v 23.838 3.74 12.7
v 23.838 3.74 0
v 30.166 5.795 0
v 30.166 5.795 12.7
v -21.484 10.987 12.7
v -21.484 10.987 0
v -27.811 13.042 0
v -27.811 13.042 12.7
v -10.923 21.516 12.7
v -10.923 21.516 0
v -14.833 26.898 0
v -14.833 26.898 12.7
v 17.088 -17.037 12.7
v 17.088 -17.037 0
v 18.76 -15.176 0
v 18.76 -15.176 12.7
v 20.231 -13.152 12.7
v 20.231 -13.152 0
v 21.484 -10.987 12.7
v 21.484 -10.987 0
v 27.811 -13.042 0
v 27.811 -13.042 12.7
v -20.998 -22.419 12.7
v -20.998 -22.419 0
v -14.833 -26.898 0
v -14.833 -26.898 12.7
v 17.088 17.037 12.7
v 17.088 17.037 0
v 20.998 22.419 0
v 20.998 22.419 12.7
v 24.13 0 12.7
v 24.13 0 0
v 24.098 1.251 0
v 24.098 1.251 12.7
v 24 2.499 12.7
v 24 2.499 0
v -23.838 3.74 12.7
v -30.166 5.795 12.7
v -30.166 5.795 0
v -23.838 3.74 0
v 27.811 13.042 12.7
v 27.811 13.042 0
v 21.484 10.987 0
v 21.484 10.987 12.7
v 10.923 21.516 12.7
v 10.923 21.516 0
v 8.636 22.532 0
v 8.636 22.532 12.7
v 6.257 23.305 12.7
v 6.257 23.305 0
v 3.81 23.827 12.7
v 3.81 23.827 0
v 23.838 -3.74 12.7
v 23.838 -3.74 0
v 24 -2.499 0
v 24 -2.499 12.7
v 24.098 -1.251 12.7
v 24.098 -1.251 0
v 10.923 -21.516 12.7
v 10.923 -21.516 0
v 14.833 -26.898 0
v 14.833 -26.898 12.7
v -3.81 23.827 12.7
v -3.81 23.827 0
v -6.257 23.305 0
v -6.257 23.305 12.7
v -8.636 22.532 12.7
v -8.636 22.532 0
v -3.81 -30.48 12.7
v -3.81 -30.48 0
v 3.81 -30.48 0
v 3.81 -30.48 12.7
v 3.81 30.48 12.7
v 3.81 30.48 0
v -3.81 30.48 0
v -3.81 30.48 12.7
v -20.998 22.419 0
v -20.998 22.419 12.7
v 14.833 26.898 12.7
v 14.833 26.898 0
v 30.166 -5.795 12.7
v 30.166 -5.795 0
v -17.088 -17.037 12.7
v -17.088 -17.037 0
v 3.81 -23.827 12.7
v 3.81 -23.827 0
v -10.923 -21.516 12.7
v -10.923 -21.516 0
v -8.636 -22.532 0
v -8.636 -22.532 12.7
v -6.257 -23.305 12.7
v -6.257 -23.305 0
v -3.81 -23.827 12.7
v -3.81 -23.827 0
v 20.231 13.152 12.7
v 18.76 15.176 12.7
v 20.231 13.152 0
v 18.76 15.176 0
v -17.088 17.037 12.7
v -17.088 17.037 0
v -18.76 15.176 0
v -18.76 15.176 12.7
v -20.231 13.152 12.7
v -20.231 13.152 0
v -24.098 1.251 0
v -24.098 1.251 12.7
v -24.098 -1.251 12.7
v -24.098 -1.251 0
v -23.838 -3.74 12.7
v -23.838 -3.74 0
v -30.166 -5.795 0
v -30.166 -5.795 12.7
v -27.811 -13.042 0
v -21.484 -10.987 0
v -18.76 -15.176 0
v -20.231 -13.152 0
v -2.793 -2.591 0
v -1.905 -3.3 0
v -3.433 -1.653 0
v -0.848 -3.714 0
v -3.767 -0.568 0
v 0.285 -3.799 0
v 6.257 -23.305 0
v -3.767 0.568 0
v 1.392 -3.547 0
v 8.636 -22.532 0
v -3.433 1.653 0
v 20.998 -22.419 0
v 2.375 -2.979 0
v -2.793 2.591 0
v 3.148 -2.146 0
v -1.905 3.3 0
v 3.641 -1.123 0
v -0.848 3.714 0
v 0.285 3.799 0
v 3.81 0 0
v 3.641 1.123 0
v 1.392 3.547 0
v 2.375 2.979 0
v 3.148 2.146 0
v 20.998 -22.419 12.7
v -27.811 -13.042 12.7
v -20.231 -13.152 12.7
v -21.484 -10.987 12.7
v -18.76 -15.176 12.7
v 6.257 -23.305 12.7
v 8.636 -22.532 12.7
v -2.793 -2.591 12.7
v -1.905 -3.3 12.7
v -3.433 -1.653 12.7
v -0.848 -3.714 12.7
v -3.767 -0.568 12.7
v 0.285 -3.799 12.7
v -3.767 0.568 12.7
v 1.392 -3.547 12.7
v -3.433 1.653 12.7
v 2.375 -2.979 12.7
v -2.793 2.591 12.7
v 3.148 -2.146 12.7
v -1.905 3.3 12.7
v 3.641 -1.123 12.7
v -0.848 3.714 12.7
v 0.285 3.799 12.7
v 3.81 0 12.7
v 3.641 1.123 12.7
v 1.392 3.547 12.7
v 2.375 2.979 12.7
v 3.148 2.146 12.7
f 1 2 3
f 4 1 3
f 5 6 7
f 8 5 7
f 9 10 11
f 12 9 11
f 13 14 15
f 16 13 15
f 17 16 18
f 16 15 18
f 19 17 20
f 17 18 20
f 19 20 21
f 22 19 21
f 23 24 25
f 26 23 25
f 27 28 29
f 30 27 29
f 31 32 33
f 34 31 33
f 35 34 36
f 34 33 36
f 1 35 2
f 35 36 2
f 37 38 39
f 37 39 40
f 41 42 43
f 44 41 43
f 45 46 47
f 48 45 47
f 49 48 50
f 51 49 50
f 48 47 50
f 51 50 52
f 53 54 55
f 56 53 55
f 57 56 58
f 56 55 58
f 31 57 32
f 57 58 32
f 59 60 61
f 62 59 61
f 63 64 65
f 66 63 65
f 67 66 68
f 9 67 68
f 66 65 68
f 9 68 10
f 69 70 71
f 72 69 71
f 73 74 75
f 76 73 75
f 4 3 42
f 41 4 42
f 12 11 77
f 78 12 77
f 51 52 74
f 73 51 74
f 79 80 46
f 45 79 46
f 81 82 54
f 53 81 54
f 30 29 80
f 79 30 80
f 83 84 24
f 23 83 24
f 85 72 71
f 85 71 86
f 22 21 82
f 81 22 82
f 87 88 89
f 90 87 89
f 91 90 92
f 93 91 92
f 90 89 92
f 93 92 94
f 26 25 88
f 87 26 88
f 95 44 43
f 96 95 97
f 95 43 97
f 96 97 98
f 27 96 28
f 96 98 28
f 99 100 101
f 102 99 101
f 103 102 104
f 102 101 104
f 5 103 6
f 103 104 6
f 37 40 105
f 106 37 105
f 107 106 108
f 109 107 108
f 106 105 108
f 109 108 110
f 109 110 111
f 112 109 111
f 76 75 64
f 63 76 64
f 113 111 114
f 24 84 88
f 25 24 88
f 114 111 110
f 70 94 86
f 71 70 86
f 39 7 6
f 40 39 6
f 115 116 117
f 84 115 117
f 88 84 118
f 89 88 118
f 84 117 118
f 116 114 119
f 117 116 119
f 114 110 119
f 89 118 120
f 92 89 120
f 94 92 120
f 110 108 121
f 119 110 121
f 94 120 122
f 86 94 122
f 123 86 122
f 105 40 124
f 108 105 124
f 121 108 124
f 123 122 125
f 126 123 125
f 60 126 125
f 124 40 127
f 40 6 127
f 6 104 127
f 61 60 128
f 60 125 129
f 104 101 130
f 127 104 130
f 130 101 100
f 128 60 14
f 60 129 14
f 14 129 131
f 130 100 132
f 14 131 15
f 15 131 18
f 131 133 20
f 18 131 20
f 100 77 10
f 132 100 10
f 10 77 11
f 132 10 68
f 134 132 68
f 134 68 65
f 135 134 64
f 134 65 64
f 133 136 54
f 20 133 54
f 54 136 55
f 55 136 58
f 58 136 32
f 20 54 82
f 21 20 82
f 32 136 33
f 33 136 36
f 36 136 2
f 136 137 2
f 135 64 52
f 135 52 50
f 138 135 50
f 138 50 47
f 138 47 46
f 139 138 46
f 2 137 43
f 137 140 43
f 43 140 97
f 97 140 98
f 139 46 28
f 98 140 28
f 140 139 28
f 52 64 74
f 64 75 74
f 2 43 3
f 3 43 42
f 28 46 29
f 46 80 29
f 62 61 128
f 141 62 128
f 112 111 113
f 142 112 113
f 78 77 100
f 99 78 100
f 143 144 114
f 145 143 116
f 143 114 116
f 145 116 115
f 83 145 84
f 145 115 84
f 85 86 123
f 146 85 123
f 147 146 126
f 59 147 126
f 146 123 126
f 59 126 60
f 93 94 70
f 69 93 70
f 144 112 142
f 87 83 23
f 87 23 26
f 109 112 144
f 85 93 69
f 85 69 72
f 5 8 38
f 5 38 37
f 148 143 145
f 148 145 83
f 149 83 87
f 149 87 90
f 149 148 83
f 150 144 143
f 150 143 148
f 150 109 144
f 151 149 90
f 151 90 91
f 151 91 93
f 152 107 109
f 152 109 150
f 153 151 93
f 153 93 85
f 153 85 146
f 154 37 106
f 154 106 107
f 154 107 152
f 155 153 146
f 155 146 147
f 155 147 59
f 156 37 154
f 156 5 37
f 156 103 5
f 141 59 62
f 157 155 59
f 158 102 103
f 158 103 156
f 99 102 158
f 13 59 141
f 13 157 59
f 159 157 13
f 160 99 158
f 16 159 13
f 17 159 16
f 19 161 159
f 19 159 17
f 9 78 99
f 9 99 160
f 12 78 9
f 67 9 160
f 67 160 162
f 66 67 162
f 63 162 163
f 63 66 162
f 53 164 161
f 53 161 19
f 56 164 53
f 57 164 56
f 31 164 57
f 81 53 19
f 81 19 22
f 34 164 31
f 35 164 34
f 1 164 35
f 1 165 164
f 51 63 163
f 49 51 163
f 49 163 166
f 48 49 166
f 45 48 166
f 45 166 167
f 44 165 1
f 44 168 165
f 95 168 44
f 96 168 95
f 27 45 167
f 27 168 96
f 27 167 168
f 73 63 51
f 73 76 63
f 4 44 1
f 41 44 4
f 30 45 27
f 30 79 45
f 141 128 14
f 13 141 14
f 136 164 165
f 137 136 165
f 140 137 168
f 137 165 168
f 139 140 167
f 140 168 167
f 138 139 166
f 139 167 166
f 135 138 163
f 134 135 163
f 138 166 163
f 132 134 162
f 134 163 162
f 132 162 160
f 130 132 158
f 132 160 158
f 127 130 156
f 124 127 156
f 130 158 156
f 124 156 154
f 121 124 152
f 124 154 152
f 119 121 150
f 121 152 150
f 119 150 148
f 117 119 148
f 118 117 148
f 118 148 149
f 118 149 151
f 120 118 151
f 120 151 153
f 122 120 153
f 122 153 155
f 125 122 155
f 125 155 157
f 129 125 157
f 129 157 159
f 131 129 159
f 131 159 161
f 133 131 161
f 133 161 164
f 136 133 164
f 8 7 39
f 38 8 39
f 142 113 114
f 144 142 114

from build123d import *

# Parameters (mm, degrees)
F1_DEPTH = 12.7
F2_R     = 3.81
F3_DEPTH = 25.4


# Not quite as in the source:
# - a feature names something its author has since deleted; it is built from what else it names


with BuildPart() as f1:
    # F0 (on Top) → F1 (new body)
    with BuildSketch(Plane.XY):
        with BuildLine():
            ThreePointArc((23.8384751489, -3.7395190297), (24.0570083899, -1.8754325709), (24.13, 0))
            ThreePointArc((24.13, 0), (24.0570083899, 1.8754325709), (23.8384751489, 3.7395190297))
            Line((23.8384751489, 3.7395190297), (12.3294189943, 0))
            Line((12.3294189943, 0), (23.8384751489, -3.7395190297))
        make_face()
        with BuildLine():
            Line((12.3294189943, 0), (23.8384751489, 3.7395190297))
            ThreePointArc((23.8384751489, 3.7395190297), (22.9489937382, 7.4565800743), (21.4837656518, 10.9865696839))
            Line((21.4837656518, 10.9865696839), (9.9747094971, 7.2470506542))
            Line((9.9747094971, 7.2470506542), (6.1647094971, 2.0030355372))
            Line((6.1647094971, 2.0030355372), (12.3294189943, 0))
        make_face()
        with BuildLine():
            ThreePointArc((21.4837656518, 10.9865696839), (22.9489937382, 7.4565800743), (23.8384751489, 3.7395190297))
            Line((23.8384751489, 3.7395190297), (30.1655573652, 5.7953126615))
            Line((30.1655573652, 5.7953126615), (27.8108478681, 13.0423633156))
            Line((27.8108478681, 13.0423633156), (21.4837656518, 10.9865696839))
        make_face()
        with BuildLine():
            Line((30.1655573652, -5.7953126615), (23.8384751489, -3.7395190297))
            ThreePointArc((23.8384751489, -3.7395190297), (22.9489937382, -7.4565800743), (21.4837656518, -10.9865696839))
            Line((21.4837656518, -10.9865696839), (27.8108478681, -13.0423633156))
            Line((27.8108478681, -13.0423633156), (30.1655573652, -5.7953126615))
        make_face()
        with BuildLine():
            ThreePointArc((21.4837656518, -10.9865696839), (22.9489937382, -7.4565800743), (23.8384751489, -3.7395190297))
            Line((23.8384751489, -3.7395190297), (12.3294189943, 0))
            Line((12.3294189943, 0), (6.1647094971, -2.0030355372))
            Line((6.1647094971, -2.0030355372), (9.9747094971, -7.2470506542))
            Line((9.9747094971, -7.2470506542), (21.4837656518, -10.9865696839))
        make_face()
        with BuildLine():
            Line((9.9747094971, 7.2470506542), (21.4837656518, 10.9865696839))
            ThreePointArc((21.4837656518, 10.9865696839), (19.5215800743, 14.1832581378), (17.0876973792, 17.0372385755))
            Line((17.0876973792, 17.0372385755), (9.9747094971, 7.2470506542))
        make_face()
        with BuildLine():
            ThreePointArc((17.0876973792, -17.0372385755), (19.5215800743, -14.1832581378), (21.4837656518, -10.9865696839))
            Line((21.4837656518, -10.9865696839), (9.9747094971, -7.2470506542))
            Line((9.9747094971, -7.2470506542), (17.0876973792, -17.0372385755))
        make_face()
        with BuildLine():
            Line((9.9747094971, 7.2470506542), (17.0876973792, 17.0372385755))
            ThreePointArc((17.0876973792, 17.0372385755), (14.1832581378, 19.5215800743), (10.922987882, 21.516162198))
            Line((10.922987882, 21.516162198), (3.81, 11.7259742766))
            Line((3.81, 11.7259742766), (3.81, 5.244015117))
            Line((3.81, 5.244015117), (9.9747094971, 7.2470506542))
        make_face()
        with BuildLine():
            ThreePointArc((10.922987882, 21.516162198), (14.1832581378, 19.5215800743), (17.0876973792, 17.0372385755))
            Line((17.0876973792, 17.0372385755), (20.9980492384, 22.4193761773))
            Line((20.9980492384, 22.4193761773), (14.8333397413, 26.8982997998))
            Line((14.8333397413, 26.8982997998), (10.922987882, 21.516162198))
        make_face()
        with BuildLine():
            Line((20.9980492384, -22.4193761773), (17.0876973792, -17.0372385755))
            ThreePointArc((17.0876973792, -17.0372385755), (14.1832581378, -19.5215800743), (10.922987882, -21.516162198))
            Line((10.922987882, -21.516162198), (14.8333397413, -26.8982997998))
            Line((14.8333397413, -26.8982997998), (20.9980492384, -22.4193761773))
        make_face()
        with BuildLine():
            ThreePointArc((10.922987882, -21.516162198), (14.1832581378, -19.5215800743), (17.0876973792, -17.0372385755))
            Line((17.0876973792, -17.0372385755), (9.9747094971, -7.2470506542))
            Line((9.9747094971, -7.2470506542), (3.81, -5.244015117))
            Line((3.81, -5.244015117), (3.81, -11.7259742766))
            Line((3.81, -11.7259742766), (10.922987882, -21.516162198))
        make_face()
        with BuildLine():
            Line((3.81, 11.7259742766), (10.922987882, 21.516162198))
            ThreePointArc((10.922987882, 21.516162198), (7.4565800743, 22.9489937382), (3.81, 23.8273120599))
            Line((3.81, 23.8273120599), (3.81, 11.7259742766))
        make_face()
        with BuildLine():
            ThreePointArc((3.81, -23.8273120599), (7.4565800743, -22.9489937382), (10.922987882, -21.516162198))
            Line((10.922987882, -21.516162198), (3.81, -11.7259742766))
            Line((3.81, -11.7259742766), (3.81, -23.8273120599))
        make_face()
        with BuildLine():
            Line((3.81, 11.7259742766), (3.81, 23.8273120599))
            ThreePointArc((3.81, 23.8273120599), (0, 24.13), (-3.81, 23.8273120599))
            Line((-3.81, 23.8273120599), (-3.81, 11.7259742766))
            Line((-3.81, 11.7259742766), (0, 6.4819591596))
            Line((0, 6.4819591596), (3.81, 11.7259742766))
        make_face()
        with BuildLine():
            ThreePointArc((-3.81, 23.8273120599), (0, 24.13), (3.81, 23.8273120599))
            Line((3.81, 23.8273120599), (3.81, 30.48))
            Line((3.81, 30.48), (-3.81, 30.48))
            Line((-3.81, 30.48), (-3.81, 23.8273120599))
        make_face()
        with BuildLine():
            Line((3.81, -30.48), (3.81, -23.8273120599))
            ThreePointArc((3.81, -23.8273120599), (0, -24.13), (-3.81, -23.8273120599))
            Line((-3.81, -23.8273120599), (-3.81, -30.48))
            Line((-3.81, -30.48), (3.81, -30.48))
        make_face()
        with BuildLine():
            ThreePointArc((-3.81, -23.8273120599), (0, -24.13), (3.81, -23.8273120599))
            Line((3.81, -23.8273120599), (3.81, -11.7259742766))
            Line((3.81, -11.7259742766), (0, -6.4819591596))
            Line((0, -6.4819591596), (-3.81, -11.7259742766))
            Line((-3.81, -11.7259742766), (-3.81, -23.8273120599))
        make_face()
        with BuildLine():
            Line((-3.81, 11.7259742766), (-3.81, 23.8273120599))
            ThreePointArc((-3.81, 23.8273120599), (-7.4565800743, 22.9489937382), (-10.922987882, 21.516162198))
            Line((-10.922987882, 21.516162198), (-3.81, 11.7259742766))
        make_face()
        with BuildLine():
            ThreePointArc((-10.922987882, -21.516162198), (-7.4565800743, -22.9489937382), (-3.81, -23.8273120599))
            Line((-3.81, -23.8273120599), (-3.81, -11.7259742766))
            Line((-3.81, -11.7259742766), (-10.922987882, -21.516162198))
        make_face()
        with BuildLine():
            Line((-3.81, 11.7259742766), (-10.922987882, 21.516162198))
            ThreePointArc((-10.922987882, 21.516162198), (-14.1832581378, 19.5215800743), (-17.0876973792, 17.0372385755))
            Line((-17.0876973792, 17.0372385755), (-9.9747094971, 7.2470506542))
            Line((-9.9747094971, 7.2470506542), (-3.81, 5.244015117))
            Line((-3.81, 5.244015117), (-3.81, 11.7259742766))
        make_face()
        with BuildLine():
            ThreePointArc((-17.0876973792, 17.0372385755), (-14.1832581378, 19.5215800743), (-10.922987882, 21.516162198))
            Line((-10.922987882, 21.516162198), (-14.8333397413, 26.8982997998))
            Line((-14.8333397413, 26.8982997998), (-20.9980492384, 22.4193761773))
            Line((-20.9980492384, 22.4193761773), (-17.0876973792, 17.0372385755))
        make_face()
        with BuildLine():
            Line((-14.8333397413, -26.8982997998), (-10.922987882, -21.516162198))
            ThreePointArc((-10.922987882, -21.516162198), (-14.1832581378, -19.5215800743), (-17.0876973792, -17.0372385755))
            Line((-17.0876973792, -17.0372385755), (-20.9980492384, -22.4193761773))
            Line((-20.9980492384, -22.4193761773), (-14.8333397413, -26.8982997998))
        make_face()
        with BuildLine():
            ThreePointArc((-17.0876973792, -17.0372385755), (-14.1832581378, -19.5215800743), (-10.922987882, -21.516162198))
            Line((-10.922987882, -21.516162198), (-3.81, -11.7259742766))
            Line((-3.81, -11.7259742766), (-3.81, -5.244015117))
            Line((-3.81, -5.244015117), (-9.9747094971, -7.2470506542))
            Line((-9.9747094971, -7.2470506542), (-17.0876973792, -17.0372385755))
        make_face()
        with BuildLine():
            Line((-9.9747094971, 7.2470506542), (-17.0876973792, 17.0372385755))
            ThreePointArc((-17.0876973792, 17.0372385755), (-19.5215800743, 14.1832581378), (-21.4837656518, 10.9865696839))
            Line((-21.4837656518, 10.9865696839), (-9.9747094971, 7.2470506542))
        make_face()
        with BuildLine():
            ThreePointArc((-21.4837656518, -10.9865696839), (-19.5215800743, -14.1832581378), (-17.0876973792, -17.0372385755))
            Line((-17.0876973792, -17.0372385755), (-9.9747094971, -7.2470506542))
            Line((-9.9747094971, -7.2470506542), (-21.4837656518, -10.9865696839))
        make_face()
        with BuildLine():
            Line((-9.9747094971, 7.2470506542), (-21.4837656518, 10.9865696839))
            ThreePointArc((-21.4837656518, 10.9865696839), (-22.9489937382, 7.4565800743), (-23.8384751489, 3.7395190297))
            Line((-23.8384751489, 3.7395190297), (-12.3294189943, 0))
            Line((-12.3294189943, 0), (-6.1647094971, 2.0030355372))
            Line((-6.1647094971, 2.0030355372), (-9.9747094971, 7.2470506542))
        make_face()
        with BuildLine():
            ThreePointArc((-23.8384751489, 3.7395190297), (-22.9489937382, 7.4565800743), (-21.4837656518, 10.9865696839))
            Line((-21.4837656518, 10.9865696839), (-27.8108478681, 13.0423633156))
            Line((-27.8108478681, 13.0423633156), (-30.1655573652, 5.7953126615))
            Line((-30.1655573652, 5.7953126615), (-23.8384751489, 3.7395190297))
        make_face()
        with BuildLine():
            Line((-27.8108478681, -13.0423633156), (-21.4837656518, -10.9865696839))
            ThreePointArc((-21.4837656518, -10.9865696839), (-22.9489937382, -7.4565800743), (-23.8384751489, -3.7395190297))
            Line((-23.8384751489, -3.7395190297), (-30.1655573652, -5.7953126615))
            Line((-30.1655573652, -5.7953126615), (-27.8108478681, -13.0423633156))
        make_face()
        with BuildLine():
            ThreePointArc((-23.8384751489, -3.7395190297), (-22.9489937382, -7.4565800743), (-21.4837656518, -10.9865696839))
            Line((-21.4837656518, -10.9865696839), (-9.9747094971, -7.2470506542))
            Line((-9.9747094971, -7.2470506542), (-6.1647094971, -2.0030355372))
            Line((-6.1647094971, -2.0030355372), (-12.3294189943, 0))
            Line((-12.3294189943, 0), (-23.8384751489, -3.7395190297))
        make_face()
        with BuildLine():
            Line((-12.3294189943, 0), (-23.8384751489, 3.7395190297))
            ThreePointArc((-23.8384751489, 3.7395190297), (-24.13, 0), (-23.8384751489, -3.7395190297))
            Line((-23.8384751489, -3.7395190297), (-12.3294189943, 0))
        make_face()
        Polygon((0, -6.4819591596), (1.4552905029, -4.4789236225), (0, -4.0060710743), (-1.4552905029, -4.4789236225), align=None)
        Polygon((-3.81, -5.244015117), (-1.4552905029, -4.4789236225), (-2.3547094971, -3.2409795798), (-3.81, -2.7681270317), align=None)
        Polygon((-3.81, -2.7681270317), (-3.81, -1.2379440426), (-4.7094189943, 0), (-6.1647094971, -2.0030355372), align=None)
        Polygon((-3.81, 1.2379440426), (-3.81, 2.7681270317), (-6.1647094971, 2.0030355372), (-4.7094189943, 0), align=None)
        Polygon((3.81, -5.244015117), (3.81, -2.7681270317), (2.3547094971, -3.2409795798), (1.4552905029, -4.4789236225), align=None)
        Polygon((3.81, -2.7681270317), (6.1647094971, -2.0030355372), (4.7094189943, 0), (3.81, -1.2379440426), align=None)
        Polygon((6.1647094971, -2.0030355372), (12.3294189943, 0), (6.1647094971, 2.0030355372), (4.7094189943, 0), align=None)
        Polygon((9.9747094971, -7.2470506542), (6.1647094971, -2.0030355372), (3.81, -2.7681270317), (3.81, -5.244015117), align=None)
        Polygon((2.3547094971, -3.2409795798), (3.81, -2.7681270317), (3.81, -1.2379440426), (3.0823547486, -2.2394618112), align=None)
        Polygon((3.81, -11.7259742766), (3.81, -5.244015117), (1.4552905029, -4.4789236225), (0, -6.4819591596), align=None)
        Polygon((1.4552905029, -4.4789236225), (2.3547094971, -3.2409795798), (1.1773547486, -3.6235253271), (0, -4.0060710743), align=None)
        Polygon((-3.81, -11.7259742766), (0, -6.4819591596), (-1.4552905029, -4.4789236225), (-3.81, -5.244015117), align=None)
        Polygon((-1.4552905029, -4.4789236225), (0, -4.0060710743), (-1.1773547486, -3.6235253271), (-2.3547094971, -3.2409795798), align=None)
        Polygon((-9.9747094971, -7.2470506542), (-3.81, -5.244015117), (-3.81, -2.7681270317), (-6.1647094971, -2.0030355372), align=None)
        Polygon((-3.81, -2.7681270317), (-2.3547094971, -3.2409795798), (-3.0823547486, -2.2394618112), (-3.81, -1.2379440426), align=None)
        Polygon((-4.7094189943, 0), (-6.1647094971, 2.0030355372), (-12.3294189943, 0), (-6.1647094971, -2.0030355372), align=None)
        Polygon((-3.81, -1.2379440426), (-3.81, 0), (-3.81, 1.2379440426), (-4.7094189943, 0), align=None)
        Polygon((-3.81, 2.7681270317), (-3.81, 5.244015117), (-9.9747094971, 7.2470506542), (-6.1647094971, 2.0030355372), align=None)
        Polygon((-3.0823547486, 2.2394618112), (-2.3547094971, 3.2409795798), (-3.81, 2.7681270317), (-3.81, 1.2379440426), align=None)
        Polygon((-1.4552905029, 4.4789236225), (0, 6.4819591596), (-3.81, 11.7259742766), (-3.81, 5.244015117), align=None)
        Polygon((-2.3547094971, 3.2409795798), (-1.4552905029, 4.4789236225), (-3.81, 5.244015117), (-3.81, 2.7681270317), align=None)
        Polygon((6.1647094971, 2.0030355372), (9.9747094971, 7.2470506542), (3.81, 5.244015117), (3.81, 2.7681270317), align=None)
        Polygon((1.4552905029, 4.4789236225), (3.81, 5.244015117), (3.81, 11.7259742766), (0, 6.4819591596), align=None)
        Polygon((-1.1773547486, 3.6235253271), (0, 4.0060710743), (-1.4552905029, 4.4789236225), (-2.3547094971, 3.2409795798), align=None)
        Polygon((0, 4.0060710743), (1.4552905029, 4.4789236225), (0, 6.4819591596), (-1.4552905029, 4.4789236225), align=None)
        Polygon((2.3547094971, 3.2409795798), (1.4552905029, 4.4789236225), (0, 4.0060710743), (1.1773547486, 3.6235253271), align=None)
        Polygon((3.81, 1.2379440426), (3.81, 2.7681270317), (2.3547094971, 3.2409795798), (3.0823547486, 2.2394618112), align=None)
        Polygon((4.7094189943, 0), (6.1647094971, 2.0030355372), (3.81, 2.7681270317), (3.81, 1.2379440426), align=None)
        Polygon((3.81, -1.2379440426), (4.7094189943, 0), (3.81, 1.2379440426), (3.81, 0), align=None)
        Polygon((3.81, 2.7681270317), (3.81, 5.244015117), (1.4552905029, 4.4789236225), (2.3547094971, 3.2409795798), align=None)
        Polygon((3.81, 0), (3.81, 1.2379440426), (3.0823547486, 2.2394618112), (2.3547094971, 3.2409795798), (1.1773547486, 3.6235253271), (0, 4.0060710743), (-1.1773547486, 3.6235253271), (-2.3547094971, 3.2409795798), (-3.0823547486, 2.2394618112), (-3.81, 1.2379440426), (-3.81, 0), (0, 0), align=None)
        Polygon((3.0823547486, -2.2394618112), (3.81, -1.2379440426), (3.81, 0), (0, 0), (-3.81, 0), (-3.81, -1.2379440426), (-3.0823547486, -2.2394618112), (-2.3547094971, -3.2409795798), (-1.1773547486, -3.6235253271), (0, -4.0060710743), (1.1773547486, -3.6235253271), (2.3547094971, -3.2409795798), align=None)
    extrude(amount=F1_DEPTH)

    # F2 (on face) → F3 (cut)
    with BuildSketch(Plane.XY.offset(12.7)):
        Circle(F2_R)
    extrude(amount=-F3_DEPTH, mode=Mode.SUBTRACT)


solid = f1.part
